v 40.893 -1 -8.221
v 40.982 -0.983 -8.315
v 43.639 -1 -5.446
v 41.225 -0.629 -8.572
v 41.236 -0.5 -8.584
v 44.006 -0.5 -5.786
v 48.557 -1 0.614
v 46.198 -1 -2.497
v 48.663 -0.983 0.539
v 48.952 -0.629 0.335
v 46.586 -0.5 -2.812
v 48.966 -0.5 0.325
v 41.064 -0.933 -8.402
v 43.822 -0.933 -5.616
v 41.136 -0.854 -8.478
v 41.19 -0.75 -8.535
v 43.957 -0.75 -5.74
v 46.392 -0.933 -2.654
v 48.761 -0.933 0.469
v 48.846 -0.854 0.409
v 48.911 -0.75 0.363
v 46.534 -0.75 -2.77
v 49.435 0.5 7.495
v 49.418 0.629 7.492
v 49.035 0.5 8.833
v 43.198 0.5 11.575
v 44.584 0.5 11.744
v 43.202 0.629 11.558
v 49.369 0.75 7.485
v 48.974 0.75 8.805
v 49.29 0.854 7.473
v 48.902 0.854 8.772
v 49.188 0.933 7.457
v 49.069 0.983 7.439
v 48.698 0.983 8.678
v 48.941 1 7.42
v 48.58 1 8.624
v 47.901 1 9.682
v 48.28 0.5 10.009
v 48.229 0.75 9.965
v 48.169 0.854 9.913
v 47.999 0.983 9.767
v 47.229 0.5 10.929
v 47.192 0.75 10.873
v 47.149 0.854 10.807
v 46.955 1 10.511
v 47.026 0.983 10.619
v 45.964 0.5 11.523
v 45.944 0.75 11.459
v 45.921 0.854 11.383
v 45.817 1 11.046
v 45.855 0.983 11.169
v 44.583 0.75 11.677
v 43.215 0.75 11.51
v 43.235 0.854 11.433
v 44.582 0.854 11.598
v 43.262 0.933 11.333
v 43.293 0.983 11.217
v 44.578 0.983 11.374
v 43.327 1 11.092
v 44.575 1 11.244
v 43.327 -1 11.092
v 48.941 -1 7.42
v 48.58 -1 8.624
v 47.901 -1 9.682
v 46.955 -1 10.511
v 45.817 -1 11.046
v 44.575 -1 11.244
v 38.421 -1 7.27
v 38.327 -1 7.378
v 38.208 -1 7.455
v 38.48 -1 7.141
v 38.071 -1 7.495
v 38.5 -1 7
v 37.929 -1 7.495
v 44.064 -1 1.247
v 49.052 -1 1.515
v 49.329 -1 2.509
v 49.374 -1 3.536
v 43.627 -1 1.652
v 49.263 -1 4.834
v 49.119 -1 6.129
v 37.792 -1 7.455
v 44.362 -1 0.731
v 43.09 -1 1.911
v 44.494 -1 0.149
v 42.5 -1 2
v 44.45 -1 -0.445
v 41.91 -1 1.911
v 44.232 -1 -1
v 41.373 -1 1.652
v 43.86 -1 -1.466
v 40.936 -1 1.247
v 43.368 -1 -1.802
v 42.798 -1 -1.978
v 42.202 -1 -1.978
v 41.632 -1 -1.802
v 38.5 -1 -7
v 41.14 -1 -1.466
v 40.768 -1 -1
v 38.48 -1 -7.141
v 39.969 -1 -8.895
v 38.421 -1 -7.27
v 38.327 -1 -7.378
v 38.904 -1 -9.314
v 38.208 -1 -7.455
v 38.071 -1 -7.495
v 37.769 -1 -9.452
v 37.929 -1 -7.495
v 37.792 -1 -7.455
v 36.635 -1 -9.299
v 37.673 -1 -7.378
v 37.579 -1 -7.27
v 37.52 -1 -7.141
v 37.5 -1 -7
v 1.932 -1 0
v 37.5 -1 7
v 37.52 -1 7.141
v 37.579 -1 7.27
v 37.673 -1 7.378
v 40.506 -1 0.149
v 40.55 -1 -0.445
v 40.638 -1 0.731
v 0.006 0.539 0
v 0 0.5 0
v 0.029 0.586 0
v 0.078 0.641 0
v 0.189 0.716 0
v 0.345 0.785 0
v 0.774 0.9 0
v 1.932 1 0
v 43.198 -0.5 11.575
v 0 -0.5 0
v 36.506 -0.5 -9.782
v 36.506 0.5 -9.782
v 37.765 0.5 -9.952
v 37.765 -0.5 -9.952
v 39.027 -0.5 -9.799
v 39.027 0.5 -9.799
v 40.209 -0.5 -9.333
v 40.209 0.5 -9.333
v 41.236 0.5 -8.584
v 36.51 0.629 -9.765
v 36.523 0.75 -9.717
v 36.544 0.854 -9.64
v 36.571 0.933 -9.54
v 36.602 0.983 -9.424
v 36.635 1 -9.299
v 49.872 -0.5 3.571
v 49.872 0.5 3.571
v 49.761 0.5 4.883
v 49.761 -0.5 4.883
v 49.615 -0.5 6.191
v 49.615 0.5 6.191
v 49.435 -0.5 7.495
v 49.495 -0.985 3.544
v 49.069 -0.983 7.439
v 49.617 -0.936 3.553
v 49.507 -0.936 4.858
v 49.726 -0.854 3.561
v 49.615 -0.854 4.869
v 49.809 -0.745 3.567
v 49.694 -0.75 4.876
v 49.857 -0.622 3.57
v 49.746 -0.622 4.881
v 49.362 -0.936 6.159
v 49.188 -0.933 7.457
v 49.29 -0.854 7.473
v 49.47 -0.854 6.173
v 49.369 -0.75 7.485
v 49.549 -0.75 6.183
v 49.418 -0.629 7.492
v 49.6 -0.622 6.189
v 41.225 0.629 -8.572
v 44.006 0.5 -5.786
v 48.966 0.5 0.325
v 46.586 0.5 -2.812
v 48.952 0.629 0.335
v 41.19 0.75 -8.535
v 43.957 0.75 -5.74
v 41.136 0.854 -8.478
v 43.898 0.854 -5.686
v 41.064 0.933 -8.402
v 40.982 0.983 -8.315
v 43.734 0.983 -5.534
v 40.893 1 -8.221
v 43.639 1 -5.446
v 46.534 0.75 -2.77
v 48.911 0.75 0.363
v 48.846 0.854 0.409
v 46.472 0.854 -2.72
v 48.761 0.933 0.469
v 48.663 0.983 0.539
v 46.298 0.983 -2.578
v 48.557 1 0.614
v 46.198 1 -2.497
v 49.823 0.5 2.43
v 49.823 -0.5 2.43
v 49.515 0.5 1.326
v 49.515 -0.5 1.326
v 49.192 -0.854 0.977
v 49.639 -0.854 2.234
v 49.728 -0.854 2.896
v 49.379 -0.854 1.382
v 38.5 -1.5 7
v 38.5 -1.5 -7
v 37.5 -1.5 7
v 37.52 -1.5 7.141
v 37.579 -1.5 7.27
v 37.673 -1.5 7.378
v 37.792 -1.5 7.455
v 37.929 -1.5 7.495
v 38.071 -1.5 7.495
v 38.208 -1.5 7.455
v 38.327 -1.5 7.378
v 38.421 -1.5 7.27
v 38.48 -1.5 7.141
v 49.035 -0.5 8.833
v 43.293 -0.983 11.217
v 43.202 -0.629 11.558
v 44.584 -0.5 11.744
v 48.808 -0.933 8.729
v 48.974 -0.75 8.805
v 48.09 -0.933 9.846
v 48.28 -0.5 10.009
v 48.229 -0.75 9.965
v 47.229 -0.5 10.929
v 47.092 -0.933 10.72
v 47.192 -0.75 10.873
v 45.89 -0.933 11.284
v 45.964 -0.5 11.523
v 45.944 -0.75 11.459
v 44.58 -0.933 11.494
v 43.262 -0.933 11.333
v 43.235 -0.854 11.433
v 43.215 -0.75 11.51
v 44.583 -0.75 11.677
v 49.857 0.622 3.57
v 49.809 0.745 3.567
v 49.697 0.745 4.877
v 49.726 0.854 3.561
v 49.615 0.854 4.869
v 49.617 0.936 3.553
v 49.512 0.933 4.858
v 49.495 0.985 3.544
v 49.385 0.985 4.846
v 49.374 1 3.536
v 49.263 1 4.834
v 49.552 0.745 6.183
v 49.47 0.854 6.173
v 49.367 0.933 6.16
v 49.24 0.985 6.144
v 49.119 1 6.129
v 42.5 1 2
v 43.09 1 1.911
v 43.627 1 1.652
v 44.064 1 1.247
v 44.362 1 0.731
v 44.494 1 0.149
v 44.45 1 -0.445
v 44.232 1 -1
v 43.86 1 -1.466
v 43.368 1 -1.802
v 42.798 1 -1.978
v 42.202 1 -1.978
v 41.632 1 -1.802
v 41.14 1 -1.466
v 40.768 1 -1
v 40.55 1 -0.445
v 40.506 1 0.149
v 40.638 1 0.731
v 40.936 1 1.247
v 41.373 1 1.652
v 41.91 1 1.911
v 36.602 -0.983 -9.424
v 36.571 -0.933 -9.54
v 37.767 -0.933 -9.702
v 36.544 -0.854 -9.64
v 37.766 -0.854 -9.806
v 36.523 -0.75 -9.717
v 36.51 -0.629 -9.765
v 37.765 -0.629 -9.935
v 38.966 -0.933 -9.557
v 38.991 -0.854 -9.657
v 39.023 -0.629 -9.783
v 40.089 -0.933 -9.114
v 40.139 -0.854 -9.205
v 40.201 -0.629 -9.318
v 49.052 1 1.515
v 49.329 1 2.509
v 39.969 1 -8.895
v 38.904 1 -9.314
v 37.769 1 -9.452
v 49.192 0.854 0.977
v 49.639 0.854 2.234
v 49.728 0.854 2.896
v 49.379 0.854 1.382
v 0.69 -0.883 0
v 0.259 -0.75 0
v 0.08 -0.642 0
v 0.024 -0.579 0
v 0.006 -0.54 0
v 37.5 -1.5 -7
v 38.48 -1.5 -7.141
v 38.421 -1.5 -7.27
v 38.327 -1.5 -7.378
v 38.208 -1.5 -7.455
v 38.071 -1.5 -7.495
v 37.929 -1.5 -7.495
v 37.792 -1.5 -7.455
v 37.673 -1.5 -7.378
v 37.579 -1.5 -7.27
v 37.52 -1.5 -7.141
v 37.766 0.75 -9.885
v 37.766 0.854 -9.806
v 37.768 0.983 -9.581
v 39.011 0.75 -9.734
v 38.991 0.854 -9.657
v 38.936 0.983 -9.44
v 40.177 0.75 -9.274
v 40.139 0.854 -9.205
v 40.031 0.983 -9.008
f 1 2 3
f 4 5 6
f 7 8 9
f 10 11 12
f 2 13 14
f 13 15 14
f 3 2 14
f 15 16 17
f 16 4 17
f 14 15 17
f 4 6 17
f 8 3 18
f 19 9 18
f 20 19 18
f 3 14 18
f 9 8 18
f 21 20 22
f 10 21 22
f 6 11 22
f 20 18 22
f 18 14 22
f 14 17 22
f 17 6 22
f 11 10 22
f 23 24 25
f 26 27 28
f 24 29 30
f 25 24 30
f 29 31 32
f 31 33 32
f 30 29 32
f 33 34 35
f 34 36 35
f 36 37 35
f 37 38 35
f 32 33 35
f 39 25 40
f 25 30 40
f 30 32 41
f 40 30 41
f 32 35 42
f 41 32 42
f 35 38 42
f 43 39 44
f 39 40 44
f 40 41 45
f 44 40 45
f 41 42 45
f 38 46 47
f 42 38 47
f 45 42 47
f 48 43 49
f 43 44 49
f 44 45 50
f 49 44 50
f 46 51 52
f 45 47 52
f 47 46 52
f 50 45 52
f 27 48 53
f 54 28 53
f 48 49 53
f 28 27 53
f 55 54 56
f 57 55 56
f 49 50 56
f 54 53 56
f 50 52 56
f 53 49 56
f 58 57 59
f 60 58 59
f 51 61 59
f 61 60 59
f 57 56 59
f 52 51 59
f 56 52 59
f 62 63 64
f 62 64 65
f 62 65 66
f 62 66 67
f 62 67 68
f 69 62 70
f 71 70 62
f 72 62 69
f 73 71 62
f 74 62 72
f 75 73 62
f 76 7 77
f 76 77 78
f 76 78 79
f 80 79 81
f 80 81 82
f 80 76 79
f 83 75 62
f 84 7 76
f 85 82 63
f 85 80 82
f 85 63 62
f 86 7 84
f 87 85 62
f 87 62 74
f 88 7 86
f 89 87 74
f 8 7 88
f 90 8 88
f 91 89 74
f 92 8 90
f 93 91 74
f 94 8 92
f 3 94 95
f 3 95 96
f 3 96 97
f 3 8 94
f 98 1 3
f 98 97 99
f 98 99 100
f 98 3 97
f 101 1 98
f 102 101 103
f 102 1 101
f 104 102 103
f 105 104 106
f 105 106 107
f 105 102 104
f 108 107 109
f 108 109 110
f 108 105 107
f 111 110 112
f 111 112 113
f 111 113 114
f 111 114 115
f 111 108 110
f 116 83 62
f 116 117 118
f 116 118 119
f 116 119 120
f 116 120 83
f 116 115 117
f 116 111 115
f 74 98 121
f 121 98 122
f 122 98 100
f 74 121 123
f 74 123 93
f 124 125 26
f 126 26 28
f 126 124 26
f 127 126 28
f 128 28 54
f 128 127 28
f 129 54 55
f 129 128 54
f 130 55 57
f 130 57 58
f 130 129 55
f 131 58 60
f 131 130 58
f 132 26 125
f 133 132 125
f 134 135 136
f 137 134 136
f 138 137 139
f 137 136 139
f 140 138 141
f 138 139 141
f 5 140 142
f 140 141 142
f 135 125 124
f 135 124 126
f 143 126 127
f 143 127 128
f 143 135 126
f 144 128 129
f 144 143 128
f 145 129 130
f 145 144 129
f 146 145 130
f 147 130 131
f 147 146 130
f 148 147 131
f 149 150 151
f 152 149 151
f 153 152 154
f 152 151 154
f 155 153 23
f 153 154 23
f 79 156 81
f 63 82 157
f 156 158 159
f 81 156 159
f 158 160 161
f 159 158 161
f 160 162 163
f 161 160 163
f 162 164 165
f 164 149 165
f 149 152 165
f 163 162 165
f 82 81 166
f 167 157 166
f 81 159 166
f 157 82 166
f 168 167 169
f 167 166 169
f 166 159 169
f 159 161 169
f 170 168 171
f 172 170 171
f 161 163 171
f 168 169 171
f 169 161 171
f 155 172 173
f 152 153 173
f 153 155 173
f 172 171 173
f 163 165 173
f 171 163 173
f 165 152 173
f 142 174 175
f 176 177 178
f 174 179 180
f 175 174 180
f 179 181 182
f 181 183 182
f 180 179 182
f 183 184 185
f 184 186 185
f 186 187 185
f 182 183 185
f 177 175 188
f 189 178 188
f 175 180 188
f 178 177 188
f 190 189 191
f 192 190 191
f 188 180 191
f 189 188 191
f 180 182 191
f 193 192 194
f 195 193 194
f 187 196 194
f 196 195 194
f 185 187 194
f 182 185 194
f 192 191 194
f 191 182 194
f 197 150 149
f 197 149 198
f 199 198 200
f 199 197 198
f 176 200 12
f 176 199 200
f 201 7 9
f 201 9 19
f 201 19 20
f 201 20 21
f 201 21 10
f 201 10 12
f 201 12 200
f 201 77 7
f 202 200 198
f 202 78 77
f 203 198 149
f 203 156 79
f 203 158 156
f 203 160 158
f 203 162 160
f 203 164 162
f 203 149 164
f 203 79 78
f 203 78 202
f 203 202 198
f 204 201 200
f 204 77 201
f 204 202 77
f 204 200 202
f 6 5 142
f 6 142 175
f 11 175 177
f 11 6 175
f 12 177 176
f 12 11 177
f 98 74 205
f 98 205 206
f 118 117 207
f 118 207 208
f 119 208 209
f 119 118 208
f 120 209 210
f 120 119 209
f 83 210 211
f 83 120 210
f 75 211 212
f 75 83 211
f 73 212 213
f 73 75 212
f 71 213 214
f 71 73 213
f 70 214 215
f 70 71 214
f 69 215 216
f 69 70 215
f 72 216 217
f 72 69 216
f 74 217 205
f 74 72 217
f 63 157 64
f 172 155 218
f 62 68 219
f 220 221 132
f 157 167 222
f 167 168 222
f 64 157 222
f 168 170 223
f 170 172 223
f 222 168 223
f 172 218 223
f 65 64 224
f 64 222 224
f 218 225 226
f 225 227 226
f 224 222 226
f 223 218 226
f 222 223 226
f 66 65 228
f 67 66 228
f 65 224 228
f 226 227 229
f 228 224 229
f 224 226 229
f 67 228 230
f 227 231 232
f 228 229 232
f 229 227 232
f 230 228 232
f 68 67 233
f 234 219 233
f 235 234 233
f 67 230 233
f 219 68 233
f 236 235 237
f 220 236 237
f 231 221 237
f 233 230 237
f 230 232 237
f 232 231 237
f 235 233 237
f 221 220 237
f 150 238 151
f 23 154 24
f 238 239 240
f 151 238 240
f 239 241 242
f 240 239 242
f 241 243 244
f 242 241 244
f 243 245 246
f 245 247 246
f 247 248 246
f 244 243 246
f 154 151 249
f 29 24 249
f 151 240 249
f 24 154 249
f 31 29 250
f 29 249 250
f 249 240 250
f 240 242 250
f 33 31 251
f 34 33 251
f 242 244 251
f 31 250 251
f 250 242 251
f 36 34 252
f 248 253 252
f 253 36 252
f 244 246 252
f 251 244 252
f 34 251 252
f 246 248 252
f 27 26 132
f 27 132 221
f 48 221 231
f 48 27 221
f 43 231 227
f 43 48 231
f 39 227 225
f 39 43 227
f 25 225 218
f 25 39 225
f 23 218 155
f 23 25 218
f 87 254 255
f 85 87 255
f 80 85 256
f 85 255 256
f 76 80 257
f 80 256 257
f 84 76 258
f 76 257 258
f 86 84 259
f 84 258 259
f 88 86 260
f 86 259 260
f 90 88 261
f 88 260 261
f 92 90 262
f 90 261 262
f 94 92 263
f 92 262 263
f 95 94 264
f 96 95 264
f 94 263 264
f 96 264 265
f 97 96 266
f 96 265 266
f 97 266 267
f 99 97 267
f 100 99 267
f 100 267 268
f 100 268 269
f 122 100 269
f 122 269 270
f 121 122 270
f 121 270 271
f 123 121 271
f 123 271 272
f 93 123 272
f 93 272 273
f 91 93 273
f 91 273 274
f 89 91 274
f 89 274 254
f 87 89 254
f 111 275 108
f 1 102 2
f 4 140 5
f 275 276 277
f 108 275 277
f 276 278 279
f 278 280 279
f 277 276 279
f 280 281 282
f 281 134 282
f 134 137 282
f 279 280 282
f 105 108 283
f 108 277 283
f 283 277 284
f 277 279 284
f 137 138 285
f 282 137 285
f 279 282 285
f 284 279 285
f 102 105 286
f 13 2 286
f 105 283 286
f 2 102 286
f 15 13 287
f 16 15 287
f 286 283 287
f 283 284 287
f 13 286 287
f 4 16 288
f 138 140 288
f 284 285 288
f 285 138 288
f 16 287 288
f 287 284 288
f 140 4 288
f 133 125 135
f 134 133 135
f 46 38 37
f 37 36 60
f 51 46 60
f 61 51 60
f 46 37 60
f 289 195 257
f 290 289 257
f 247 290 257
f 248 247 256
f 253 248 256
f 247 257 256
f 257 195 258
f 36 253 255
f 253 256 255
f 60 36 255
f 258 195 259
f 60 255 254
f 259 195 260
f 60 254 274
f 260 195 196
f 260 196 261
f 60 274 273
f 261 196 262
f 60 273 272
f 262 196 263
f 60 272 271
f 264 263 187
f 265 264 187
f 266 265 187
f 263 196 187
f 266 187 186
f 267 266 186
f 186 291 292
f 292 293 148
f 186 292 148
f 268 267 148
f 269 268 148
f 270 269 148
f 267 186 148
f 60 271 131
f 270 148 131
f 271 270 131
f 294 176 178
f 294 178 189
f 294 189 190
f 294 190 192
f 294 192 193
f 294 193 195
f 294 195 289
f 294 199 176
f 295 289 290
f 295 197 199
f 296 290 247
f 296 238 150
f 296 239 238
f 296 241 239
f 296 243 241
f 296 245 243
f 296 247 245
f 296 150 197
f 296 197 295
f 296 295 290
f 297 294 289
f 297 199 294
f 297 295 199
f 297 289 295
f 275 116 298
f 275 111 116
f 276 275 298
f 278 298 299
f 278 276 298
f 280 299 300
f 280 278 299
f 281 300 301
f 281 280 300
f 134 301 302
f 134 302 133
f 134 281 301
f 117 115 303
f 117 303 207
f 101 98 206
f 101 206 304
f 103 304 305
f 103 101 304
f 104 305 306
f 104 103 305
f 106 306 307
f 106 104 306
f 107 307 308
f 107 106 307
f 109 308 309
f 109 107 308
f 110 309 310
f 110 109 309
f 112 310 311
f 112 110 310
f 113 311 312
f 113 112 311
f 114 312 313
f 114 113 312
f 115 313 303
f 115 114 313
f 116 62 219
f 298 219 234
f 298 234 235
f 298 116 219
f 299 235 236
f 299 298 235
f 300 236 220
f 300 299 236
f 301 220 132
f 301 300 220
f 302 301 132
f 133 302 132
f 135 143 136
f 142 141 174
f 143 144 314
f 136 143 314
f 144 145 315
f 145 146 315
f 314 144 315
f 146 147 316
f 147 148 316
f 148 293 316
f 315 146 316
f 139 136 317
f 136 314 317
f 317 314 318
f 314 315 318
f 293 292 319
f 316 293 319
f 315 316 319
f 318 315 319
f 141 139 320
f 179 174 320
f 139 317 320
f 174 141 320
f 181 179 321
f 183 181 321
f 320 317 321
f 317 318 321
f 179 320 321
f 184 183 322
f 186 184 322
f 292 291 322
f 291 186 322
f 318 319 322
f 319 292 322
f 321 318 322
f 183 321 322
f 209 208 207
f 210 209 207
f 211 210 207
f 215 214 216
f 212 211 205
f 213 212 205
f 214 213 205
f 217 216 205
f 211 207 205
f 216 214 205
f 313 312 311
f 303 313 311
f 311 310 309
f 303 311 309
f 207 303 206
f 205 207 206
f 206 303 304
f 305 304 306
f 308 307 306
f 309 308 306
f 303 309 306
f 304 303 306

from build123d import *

# Parameters (mm, degrees)
BOSS_EXTRUDE2_DEPTH = 1
SKETCH2_R           = 2
CUT_EXTRUDE1_DEPTH  = 52.686248125
BOSS_EXTRUDE3_DEPTH = 0.5
CUT_EXTRUDE3_START  = -2
CUT_EXTRUDE3_DEPTH  = 2
FILLET1_R           = 5
FILLET2_R           = 0.5


# Read off the part's stored shape, not the designer's step: Cut-Extrude3
with BuildPart() as part:
    # Sketch1 → Boss-Extrude2 (new, symmetric)
    with BuildSketch(Plane(origin=(0, 0, 0), x_dir=(1, 0, 0), z_dir=(0, 1, 0))):
        with BuildLine():
            Line((48.296291314, -12.940952255), (0, 0))
            Line((0, 0), (48.296291314, 12.940952255))
            ThreePointArc((48.296291314, 12.940952255), (50, 0), (48.296291314, -12.940952255))
        make_face()
    extrude(amount=BOSS_EXTRUDE2_DEPTH, both=True)

    # Sketch2 → Cut-Extrude1 (cut, through all)
    with BuildSketch(Plane(origin=(0, 1, 0), x_dir=(1, 0, 0), z_dir=(0, 1, 0))):
        with Locations(Location((42.5, 0, 0), (0, 0, 270))):
            Circle(SKETCH2_R)
    extrude(amount=-CUT_EXTRUDE1_DEPTH, mode=Mode.SUBTRACT)

    # Sketch3 → Boss-Extrude3 (add)
    with BuildSketch(Plane(origin=(0, -1, 0), x_dir=(-1, 0, 0), z_dir=(0, -1, 0))):
        with BuildLine():
            Line((-38.5, -7), (-38.5, 7))
            ThreePointArc((-38.5, 7), (-38, 7.5), (-37.5, 7))
            Line((-37.5, 7), (-37.5, -7))
            ThreePointArc((-37.5, -7), (-38, -7.5), (-38.5, -7))
        make_face()
    extrude(amount=BOSS_EXTRUDE3_DEPTH)

    # Cut-Extrude3 outline → Cut-Extrude3 (cut)
    with BuildSketch(Plane(origin=(0, 1, 0), x_dir=(1, 0, 0), z_dir=(0, 1, 0)).offset(CUT_EXTRUDE3_START)):
        with BuildLine():
            ThreePointArc((39.129720832, 10.484777097), (44.969397941, 4.720942194), (49.96810207, -1.785714286))
            ThreePointArc((49.96810207, -1.785714286), (49.680896013, 5.639908806), (48.296291314, 12.940952255))
            Line((48.296291314, 12.940952255), (39.129720832, 10.484777097))
        make_face()
    extrude(amount=CUT_EXTRUDE3_DEPTH, mode=Mode.SUBTRACT)

    # Fillet1
    fillet1_edges = [part.edges().sort_by_distance(p)[0] for p in [
        (39.129720832, 0, -10.484777097),
        (49.96810207, 0, 1.785714286),
        (48.296291314, 0, 12.940952255),
    ]]
    fillet(fillet1_edges, radius=FILLET1_R)

    # Fillet2
    fillet2_edges = [part.edges().sort_by_distance(p)[0] for p in [
        (18.252899917, -1, -4.890849792),
        (18.252899917, 1, -4.890849792),
        (45.320316883, -1, -4.32008237),
        (49.692435611, -1, 5.537313704),
        (21.598758088, -1, 5.787369787),
        (47.228674266, -1, 10.929424828),
        (49.700770587, -1, 1.869330184),
        (39.027043508, -1, -9.799142423),
        (45.320316883, 1, -4.32008237),
        (21.598758088, 1, 5.787369787),
        (49.692435611, 1, 5.537313704),
        (47.228674266, 1, 10.929424828),
        (49.700770587, 1, 1.869330184),
        (39.027043508, 1, -9.799142423),
    ]]
    fillet(fillet2_edges, radius=FILLET2_R)


solid = part.part
